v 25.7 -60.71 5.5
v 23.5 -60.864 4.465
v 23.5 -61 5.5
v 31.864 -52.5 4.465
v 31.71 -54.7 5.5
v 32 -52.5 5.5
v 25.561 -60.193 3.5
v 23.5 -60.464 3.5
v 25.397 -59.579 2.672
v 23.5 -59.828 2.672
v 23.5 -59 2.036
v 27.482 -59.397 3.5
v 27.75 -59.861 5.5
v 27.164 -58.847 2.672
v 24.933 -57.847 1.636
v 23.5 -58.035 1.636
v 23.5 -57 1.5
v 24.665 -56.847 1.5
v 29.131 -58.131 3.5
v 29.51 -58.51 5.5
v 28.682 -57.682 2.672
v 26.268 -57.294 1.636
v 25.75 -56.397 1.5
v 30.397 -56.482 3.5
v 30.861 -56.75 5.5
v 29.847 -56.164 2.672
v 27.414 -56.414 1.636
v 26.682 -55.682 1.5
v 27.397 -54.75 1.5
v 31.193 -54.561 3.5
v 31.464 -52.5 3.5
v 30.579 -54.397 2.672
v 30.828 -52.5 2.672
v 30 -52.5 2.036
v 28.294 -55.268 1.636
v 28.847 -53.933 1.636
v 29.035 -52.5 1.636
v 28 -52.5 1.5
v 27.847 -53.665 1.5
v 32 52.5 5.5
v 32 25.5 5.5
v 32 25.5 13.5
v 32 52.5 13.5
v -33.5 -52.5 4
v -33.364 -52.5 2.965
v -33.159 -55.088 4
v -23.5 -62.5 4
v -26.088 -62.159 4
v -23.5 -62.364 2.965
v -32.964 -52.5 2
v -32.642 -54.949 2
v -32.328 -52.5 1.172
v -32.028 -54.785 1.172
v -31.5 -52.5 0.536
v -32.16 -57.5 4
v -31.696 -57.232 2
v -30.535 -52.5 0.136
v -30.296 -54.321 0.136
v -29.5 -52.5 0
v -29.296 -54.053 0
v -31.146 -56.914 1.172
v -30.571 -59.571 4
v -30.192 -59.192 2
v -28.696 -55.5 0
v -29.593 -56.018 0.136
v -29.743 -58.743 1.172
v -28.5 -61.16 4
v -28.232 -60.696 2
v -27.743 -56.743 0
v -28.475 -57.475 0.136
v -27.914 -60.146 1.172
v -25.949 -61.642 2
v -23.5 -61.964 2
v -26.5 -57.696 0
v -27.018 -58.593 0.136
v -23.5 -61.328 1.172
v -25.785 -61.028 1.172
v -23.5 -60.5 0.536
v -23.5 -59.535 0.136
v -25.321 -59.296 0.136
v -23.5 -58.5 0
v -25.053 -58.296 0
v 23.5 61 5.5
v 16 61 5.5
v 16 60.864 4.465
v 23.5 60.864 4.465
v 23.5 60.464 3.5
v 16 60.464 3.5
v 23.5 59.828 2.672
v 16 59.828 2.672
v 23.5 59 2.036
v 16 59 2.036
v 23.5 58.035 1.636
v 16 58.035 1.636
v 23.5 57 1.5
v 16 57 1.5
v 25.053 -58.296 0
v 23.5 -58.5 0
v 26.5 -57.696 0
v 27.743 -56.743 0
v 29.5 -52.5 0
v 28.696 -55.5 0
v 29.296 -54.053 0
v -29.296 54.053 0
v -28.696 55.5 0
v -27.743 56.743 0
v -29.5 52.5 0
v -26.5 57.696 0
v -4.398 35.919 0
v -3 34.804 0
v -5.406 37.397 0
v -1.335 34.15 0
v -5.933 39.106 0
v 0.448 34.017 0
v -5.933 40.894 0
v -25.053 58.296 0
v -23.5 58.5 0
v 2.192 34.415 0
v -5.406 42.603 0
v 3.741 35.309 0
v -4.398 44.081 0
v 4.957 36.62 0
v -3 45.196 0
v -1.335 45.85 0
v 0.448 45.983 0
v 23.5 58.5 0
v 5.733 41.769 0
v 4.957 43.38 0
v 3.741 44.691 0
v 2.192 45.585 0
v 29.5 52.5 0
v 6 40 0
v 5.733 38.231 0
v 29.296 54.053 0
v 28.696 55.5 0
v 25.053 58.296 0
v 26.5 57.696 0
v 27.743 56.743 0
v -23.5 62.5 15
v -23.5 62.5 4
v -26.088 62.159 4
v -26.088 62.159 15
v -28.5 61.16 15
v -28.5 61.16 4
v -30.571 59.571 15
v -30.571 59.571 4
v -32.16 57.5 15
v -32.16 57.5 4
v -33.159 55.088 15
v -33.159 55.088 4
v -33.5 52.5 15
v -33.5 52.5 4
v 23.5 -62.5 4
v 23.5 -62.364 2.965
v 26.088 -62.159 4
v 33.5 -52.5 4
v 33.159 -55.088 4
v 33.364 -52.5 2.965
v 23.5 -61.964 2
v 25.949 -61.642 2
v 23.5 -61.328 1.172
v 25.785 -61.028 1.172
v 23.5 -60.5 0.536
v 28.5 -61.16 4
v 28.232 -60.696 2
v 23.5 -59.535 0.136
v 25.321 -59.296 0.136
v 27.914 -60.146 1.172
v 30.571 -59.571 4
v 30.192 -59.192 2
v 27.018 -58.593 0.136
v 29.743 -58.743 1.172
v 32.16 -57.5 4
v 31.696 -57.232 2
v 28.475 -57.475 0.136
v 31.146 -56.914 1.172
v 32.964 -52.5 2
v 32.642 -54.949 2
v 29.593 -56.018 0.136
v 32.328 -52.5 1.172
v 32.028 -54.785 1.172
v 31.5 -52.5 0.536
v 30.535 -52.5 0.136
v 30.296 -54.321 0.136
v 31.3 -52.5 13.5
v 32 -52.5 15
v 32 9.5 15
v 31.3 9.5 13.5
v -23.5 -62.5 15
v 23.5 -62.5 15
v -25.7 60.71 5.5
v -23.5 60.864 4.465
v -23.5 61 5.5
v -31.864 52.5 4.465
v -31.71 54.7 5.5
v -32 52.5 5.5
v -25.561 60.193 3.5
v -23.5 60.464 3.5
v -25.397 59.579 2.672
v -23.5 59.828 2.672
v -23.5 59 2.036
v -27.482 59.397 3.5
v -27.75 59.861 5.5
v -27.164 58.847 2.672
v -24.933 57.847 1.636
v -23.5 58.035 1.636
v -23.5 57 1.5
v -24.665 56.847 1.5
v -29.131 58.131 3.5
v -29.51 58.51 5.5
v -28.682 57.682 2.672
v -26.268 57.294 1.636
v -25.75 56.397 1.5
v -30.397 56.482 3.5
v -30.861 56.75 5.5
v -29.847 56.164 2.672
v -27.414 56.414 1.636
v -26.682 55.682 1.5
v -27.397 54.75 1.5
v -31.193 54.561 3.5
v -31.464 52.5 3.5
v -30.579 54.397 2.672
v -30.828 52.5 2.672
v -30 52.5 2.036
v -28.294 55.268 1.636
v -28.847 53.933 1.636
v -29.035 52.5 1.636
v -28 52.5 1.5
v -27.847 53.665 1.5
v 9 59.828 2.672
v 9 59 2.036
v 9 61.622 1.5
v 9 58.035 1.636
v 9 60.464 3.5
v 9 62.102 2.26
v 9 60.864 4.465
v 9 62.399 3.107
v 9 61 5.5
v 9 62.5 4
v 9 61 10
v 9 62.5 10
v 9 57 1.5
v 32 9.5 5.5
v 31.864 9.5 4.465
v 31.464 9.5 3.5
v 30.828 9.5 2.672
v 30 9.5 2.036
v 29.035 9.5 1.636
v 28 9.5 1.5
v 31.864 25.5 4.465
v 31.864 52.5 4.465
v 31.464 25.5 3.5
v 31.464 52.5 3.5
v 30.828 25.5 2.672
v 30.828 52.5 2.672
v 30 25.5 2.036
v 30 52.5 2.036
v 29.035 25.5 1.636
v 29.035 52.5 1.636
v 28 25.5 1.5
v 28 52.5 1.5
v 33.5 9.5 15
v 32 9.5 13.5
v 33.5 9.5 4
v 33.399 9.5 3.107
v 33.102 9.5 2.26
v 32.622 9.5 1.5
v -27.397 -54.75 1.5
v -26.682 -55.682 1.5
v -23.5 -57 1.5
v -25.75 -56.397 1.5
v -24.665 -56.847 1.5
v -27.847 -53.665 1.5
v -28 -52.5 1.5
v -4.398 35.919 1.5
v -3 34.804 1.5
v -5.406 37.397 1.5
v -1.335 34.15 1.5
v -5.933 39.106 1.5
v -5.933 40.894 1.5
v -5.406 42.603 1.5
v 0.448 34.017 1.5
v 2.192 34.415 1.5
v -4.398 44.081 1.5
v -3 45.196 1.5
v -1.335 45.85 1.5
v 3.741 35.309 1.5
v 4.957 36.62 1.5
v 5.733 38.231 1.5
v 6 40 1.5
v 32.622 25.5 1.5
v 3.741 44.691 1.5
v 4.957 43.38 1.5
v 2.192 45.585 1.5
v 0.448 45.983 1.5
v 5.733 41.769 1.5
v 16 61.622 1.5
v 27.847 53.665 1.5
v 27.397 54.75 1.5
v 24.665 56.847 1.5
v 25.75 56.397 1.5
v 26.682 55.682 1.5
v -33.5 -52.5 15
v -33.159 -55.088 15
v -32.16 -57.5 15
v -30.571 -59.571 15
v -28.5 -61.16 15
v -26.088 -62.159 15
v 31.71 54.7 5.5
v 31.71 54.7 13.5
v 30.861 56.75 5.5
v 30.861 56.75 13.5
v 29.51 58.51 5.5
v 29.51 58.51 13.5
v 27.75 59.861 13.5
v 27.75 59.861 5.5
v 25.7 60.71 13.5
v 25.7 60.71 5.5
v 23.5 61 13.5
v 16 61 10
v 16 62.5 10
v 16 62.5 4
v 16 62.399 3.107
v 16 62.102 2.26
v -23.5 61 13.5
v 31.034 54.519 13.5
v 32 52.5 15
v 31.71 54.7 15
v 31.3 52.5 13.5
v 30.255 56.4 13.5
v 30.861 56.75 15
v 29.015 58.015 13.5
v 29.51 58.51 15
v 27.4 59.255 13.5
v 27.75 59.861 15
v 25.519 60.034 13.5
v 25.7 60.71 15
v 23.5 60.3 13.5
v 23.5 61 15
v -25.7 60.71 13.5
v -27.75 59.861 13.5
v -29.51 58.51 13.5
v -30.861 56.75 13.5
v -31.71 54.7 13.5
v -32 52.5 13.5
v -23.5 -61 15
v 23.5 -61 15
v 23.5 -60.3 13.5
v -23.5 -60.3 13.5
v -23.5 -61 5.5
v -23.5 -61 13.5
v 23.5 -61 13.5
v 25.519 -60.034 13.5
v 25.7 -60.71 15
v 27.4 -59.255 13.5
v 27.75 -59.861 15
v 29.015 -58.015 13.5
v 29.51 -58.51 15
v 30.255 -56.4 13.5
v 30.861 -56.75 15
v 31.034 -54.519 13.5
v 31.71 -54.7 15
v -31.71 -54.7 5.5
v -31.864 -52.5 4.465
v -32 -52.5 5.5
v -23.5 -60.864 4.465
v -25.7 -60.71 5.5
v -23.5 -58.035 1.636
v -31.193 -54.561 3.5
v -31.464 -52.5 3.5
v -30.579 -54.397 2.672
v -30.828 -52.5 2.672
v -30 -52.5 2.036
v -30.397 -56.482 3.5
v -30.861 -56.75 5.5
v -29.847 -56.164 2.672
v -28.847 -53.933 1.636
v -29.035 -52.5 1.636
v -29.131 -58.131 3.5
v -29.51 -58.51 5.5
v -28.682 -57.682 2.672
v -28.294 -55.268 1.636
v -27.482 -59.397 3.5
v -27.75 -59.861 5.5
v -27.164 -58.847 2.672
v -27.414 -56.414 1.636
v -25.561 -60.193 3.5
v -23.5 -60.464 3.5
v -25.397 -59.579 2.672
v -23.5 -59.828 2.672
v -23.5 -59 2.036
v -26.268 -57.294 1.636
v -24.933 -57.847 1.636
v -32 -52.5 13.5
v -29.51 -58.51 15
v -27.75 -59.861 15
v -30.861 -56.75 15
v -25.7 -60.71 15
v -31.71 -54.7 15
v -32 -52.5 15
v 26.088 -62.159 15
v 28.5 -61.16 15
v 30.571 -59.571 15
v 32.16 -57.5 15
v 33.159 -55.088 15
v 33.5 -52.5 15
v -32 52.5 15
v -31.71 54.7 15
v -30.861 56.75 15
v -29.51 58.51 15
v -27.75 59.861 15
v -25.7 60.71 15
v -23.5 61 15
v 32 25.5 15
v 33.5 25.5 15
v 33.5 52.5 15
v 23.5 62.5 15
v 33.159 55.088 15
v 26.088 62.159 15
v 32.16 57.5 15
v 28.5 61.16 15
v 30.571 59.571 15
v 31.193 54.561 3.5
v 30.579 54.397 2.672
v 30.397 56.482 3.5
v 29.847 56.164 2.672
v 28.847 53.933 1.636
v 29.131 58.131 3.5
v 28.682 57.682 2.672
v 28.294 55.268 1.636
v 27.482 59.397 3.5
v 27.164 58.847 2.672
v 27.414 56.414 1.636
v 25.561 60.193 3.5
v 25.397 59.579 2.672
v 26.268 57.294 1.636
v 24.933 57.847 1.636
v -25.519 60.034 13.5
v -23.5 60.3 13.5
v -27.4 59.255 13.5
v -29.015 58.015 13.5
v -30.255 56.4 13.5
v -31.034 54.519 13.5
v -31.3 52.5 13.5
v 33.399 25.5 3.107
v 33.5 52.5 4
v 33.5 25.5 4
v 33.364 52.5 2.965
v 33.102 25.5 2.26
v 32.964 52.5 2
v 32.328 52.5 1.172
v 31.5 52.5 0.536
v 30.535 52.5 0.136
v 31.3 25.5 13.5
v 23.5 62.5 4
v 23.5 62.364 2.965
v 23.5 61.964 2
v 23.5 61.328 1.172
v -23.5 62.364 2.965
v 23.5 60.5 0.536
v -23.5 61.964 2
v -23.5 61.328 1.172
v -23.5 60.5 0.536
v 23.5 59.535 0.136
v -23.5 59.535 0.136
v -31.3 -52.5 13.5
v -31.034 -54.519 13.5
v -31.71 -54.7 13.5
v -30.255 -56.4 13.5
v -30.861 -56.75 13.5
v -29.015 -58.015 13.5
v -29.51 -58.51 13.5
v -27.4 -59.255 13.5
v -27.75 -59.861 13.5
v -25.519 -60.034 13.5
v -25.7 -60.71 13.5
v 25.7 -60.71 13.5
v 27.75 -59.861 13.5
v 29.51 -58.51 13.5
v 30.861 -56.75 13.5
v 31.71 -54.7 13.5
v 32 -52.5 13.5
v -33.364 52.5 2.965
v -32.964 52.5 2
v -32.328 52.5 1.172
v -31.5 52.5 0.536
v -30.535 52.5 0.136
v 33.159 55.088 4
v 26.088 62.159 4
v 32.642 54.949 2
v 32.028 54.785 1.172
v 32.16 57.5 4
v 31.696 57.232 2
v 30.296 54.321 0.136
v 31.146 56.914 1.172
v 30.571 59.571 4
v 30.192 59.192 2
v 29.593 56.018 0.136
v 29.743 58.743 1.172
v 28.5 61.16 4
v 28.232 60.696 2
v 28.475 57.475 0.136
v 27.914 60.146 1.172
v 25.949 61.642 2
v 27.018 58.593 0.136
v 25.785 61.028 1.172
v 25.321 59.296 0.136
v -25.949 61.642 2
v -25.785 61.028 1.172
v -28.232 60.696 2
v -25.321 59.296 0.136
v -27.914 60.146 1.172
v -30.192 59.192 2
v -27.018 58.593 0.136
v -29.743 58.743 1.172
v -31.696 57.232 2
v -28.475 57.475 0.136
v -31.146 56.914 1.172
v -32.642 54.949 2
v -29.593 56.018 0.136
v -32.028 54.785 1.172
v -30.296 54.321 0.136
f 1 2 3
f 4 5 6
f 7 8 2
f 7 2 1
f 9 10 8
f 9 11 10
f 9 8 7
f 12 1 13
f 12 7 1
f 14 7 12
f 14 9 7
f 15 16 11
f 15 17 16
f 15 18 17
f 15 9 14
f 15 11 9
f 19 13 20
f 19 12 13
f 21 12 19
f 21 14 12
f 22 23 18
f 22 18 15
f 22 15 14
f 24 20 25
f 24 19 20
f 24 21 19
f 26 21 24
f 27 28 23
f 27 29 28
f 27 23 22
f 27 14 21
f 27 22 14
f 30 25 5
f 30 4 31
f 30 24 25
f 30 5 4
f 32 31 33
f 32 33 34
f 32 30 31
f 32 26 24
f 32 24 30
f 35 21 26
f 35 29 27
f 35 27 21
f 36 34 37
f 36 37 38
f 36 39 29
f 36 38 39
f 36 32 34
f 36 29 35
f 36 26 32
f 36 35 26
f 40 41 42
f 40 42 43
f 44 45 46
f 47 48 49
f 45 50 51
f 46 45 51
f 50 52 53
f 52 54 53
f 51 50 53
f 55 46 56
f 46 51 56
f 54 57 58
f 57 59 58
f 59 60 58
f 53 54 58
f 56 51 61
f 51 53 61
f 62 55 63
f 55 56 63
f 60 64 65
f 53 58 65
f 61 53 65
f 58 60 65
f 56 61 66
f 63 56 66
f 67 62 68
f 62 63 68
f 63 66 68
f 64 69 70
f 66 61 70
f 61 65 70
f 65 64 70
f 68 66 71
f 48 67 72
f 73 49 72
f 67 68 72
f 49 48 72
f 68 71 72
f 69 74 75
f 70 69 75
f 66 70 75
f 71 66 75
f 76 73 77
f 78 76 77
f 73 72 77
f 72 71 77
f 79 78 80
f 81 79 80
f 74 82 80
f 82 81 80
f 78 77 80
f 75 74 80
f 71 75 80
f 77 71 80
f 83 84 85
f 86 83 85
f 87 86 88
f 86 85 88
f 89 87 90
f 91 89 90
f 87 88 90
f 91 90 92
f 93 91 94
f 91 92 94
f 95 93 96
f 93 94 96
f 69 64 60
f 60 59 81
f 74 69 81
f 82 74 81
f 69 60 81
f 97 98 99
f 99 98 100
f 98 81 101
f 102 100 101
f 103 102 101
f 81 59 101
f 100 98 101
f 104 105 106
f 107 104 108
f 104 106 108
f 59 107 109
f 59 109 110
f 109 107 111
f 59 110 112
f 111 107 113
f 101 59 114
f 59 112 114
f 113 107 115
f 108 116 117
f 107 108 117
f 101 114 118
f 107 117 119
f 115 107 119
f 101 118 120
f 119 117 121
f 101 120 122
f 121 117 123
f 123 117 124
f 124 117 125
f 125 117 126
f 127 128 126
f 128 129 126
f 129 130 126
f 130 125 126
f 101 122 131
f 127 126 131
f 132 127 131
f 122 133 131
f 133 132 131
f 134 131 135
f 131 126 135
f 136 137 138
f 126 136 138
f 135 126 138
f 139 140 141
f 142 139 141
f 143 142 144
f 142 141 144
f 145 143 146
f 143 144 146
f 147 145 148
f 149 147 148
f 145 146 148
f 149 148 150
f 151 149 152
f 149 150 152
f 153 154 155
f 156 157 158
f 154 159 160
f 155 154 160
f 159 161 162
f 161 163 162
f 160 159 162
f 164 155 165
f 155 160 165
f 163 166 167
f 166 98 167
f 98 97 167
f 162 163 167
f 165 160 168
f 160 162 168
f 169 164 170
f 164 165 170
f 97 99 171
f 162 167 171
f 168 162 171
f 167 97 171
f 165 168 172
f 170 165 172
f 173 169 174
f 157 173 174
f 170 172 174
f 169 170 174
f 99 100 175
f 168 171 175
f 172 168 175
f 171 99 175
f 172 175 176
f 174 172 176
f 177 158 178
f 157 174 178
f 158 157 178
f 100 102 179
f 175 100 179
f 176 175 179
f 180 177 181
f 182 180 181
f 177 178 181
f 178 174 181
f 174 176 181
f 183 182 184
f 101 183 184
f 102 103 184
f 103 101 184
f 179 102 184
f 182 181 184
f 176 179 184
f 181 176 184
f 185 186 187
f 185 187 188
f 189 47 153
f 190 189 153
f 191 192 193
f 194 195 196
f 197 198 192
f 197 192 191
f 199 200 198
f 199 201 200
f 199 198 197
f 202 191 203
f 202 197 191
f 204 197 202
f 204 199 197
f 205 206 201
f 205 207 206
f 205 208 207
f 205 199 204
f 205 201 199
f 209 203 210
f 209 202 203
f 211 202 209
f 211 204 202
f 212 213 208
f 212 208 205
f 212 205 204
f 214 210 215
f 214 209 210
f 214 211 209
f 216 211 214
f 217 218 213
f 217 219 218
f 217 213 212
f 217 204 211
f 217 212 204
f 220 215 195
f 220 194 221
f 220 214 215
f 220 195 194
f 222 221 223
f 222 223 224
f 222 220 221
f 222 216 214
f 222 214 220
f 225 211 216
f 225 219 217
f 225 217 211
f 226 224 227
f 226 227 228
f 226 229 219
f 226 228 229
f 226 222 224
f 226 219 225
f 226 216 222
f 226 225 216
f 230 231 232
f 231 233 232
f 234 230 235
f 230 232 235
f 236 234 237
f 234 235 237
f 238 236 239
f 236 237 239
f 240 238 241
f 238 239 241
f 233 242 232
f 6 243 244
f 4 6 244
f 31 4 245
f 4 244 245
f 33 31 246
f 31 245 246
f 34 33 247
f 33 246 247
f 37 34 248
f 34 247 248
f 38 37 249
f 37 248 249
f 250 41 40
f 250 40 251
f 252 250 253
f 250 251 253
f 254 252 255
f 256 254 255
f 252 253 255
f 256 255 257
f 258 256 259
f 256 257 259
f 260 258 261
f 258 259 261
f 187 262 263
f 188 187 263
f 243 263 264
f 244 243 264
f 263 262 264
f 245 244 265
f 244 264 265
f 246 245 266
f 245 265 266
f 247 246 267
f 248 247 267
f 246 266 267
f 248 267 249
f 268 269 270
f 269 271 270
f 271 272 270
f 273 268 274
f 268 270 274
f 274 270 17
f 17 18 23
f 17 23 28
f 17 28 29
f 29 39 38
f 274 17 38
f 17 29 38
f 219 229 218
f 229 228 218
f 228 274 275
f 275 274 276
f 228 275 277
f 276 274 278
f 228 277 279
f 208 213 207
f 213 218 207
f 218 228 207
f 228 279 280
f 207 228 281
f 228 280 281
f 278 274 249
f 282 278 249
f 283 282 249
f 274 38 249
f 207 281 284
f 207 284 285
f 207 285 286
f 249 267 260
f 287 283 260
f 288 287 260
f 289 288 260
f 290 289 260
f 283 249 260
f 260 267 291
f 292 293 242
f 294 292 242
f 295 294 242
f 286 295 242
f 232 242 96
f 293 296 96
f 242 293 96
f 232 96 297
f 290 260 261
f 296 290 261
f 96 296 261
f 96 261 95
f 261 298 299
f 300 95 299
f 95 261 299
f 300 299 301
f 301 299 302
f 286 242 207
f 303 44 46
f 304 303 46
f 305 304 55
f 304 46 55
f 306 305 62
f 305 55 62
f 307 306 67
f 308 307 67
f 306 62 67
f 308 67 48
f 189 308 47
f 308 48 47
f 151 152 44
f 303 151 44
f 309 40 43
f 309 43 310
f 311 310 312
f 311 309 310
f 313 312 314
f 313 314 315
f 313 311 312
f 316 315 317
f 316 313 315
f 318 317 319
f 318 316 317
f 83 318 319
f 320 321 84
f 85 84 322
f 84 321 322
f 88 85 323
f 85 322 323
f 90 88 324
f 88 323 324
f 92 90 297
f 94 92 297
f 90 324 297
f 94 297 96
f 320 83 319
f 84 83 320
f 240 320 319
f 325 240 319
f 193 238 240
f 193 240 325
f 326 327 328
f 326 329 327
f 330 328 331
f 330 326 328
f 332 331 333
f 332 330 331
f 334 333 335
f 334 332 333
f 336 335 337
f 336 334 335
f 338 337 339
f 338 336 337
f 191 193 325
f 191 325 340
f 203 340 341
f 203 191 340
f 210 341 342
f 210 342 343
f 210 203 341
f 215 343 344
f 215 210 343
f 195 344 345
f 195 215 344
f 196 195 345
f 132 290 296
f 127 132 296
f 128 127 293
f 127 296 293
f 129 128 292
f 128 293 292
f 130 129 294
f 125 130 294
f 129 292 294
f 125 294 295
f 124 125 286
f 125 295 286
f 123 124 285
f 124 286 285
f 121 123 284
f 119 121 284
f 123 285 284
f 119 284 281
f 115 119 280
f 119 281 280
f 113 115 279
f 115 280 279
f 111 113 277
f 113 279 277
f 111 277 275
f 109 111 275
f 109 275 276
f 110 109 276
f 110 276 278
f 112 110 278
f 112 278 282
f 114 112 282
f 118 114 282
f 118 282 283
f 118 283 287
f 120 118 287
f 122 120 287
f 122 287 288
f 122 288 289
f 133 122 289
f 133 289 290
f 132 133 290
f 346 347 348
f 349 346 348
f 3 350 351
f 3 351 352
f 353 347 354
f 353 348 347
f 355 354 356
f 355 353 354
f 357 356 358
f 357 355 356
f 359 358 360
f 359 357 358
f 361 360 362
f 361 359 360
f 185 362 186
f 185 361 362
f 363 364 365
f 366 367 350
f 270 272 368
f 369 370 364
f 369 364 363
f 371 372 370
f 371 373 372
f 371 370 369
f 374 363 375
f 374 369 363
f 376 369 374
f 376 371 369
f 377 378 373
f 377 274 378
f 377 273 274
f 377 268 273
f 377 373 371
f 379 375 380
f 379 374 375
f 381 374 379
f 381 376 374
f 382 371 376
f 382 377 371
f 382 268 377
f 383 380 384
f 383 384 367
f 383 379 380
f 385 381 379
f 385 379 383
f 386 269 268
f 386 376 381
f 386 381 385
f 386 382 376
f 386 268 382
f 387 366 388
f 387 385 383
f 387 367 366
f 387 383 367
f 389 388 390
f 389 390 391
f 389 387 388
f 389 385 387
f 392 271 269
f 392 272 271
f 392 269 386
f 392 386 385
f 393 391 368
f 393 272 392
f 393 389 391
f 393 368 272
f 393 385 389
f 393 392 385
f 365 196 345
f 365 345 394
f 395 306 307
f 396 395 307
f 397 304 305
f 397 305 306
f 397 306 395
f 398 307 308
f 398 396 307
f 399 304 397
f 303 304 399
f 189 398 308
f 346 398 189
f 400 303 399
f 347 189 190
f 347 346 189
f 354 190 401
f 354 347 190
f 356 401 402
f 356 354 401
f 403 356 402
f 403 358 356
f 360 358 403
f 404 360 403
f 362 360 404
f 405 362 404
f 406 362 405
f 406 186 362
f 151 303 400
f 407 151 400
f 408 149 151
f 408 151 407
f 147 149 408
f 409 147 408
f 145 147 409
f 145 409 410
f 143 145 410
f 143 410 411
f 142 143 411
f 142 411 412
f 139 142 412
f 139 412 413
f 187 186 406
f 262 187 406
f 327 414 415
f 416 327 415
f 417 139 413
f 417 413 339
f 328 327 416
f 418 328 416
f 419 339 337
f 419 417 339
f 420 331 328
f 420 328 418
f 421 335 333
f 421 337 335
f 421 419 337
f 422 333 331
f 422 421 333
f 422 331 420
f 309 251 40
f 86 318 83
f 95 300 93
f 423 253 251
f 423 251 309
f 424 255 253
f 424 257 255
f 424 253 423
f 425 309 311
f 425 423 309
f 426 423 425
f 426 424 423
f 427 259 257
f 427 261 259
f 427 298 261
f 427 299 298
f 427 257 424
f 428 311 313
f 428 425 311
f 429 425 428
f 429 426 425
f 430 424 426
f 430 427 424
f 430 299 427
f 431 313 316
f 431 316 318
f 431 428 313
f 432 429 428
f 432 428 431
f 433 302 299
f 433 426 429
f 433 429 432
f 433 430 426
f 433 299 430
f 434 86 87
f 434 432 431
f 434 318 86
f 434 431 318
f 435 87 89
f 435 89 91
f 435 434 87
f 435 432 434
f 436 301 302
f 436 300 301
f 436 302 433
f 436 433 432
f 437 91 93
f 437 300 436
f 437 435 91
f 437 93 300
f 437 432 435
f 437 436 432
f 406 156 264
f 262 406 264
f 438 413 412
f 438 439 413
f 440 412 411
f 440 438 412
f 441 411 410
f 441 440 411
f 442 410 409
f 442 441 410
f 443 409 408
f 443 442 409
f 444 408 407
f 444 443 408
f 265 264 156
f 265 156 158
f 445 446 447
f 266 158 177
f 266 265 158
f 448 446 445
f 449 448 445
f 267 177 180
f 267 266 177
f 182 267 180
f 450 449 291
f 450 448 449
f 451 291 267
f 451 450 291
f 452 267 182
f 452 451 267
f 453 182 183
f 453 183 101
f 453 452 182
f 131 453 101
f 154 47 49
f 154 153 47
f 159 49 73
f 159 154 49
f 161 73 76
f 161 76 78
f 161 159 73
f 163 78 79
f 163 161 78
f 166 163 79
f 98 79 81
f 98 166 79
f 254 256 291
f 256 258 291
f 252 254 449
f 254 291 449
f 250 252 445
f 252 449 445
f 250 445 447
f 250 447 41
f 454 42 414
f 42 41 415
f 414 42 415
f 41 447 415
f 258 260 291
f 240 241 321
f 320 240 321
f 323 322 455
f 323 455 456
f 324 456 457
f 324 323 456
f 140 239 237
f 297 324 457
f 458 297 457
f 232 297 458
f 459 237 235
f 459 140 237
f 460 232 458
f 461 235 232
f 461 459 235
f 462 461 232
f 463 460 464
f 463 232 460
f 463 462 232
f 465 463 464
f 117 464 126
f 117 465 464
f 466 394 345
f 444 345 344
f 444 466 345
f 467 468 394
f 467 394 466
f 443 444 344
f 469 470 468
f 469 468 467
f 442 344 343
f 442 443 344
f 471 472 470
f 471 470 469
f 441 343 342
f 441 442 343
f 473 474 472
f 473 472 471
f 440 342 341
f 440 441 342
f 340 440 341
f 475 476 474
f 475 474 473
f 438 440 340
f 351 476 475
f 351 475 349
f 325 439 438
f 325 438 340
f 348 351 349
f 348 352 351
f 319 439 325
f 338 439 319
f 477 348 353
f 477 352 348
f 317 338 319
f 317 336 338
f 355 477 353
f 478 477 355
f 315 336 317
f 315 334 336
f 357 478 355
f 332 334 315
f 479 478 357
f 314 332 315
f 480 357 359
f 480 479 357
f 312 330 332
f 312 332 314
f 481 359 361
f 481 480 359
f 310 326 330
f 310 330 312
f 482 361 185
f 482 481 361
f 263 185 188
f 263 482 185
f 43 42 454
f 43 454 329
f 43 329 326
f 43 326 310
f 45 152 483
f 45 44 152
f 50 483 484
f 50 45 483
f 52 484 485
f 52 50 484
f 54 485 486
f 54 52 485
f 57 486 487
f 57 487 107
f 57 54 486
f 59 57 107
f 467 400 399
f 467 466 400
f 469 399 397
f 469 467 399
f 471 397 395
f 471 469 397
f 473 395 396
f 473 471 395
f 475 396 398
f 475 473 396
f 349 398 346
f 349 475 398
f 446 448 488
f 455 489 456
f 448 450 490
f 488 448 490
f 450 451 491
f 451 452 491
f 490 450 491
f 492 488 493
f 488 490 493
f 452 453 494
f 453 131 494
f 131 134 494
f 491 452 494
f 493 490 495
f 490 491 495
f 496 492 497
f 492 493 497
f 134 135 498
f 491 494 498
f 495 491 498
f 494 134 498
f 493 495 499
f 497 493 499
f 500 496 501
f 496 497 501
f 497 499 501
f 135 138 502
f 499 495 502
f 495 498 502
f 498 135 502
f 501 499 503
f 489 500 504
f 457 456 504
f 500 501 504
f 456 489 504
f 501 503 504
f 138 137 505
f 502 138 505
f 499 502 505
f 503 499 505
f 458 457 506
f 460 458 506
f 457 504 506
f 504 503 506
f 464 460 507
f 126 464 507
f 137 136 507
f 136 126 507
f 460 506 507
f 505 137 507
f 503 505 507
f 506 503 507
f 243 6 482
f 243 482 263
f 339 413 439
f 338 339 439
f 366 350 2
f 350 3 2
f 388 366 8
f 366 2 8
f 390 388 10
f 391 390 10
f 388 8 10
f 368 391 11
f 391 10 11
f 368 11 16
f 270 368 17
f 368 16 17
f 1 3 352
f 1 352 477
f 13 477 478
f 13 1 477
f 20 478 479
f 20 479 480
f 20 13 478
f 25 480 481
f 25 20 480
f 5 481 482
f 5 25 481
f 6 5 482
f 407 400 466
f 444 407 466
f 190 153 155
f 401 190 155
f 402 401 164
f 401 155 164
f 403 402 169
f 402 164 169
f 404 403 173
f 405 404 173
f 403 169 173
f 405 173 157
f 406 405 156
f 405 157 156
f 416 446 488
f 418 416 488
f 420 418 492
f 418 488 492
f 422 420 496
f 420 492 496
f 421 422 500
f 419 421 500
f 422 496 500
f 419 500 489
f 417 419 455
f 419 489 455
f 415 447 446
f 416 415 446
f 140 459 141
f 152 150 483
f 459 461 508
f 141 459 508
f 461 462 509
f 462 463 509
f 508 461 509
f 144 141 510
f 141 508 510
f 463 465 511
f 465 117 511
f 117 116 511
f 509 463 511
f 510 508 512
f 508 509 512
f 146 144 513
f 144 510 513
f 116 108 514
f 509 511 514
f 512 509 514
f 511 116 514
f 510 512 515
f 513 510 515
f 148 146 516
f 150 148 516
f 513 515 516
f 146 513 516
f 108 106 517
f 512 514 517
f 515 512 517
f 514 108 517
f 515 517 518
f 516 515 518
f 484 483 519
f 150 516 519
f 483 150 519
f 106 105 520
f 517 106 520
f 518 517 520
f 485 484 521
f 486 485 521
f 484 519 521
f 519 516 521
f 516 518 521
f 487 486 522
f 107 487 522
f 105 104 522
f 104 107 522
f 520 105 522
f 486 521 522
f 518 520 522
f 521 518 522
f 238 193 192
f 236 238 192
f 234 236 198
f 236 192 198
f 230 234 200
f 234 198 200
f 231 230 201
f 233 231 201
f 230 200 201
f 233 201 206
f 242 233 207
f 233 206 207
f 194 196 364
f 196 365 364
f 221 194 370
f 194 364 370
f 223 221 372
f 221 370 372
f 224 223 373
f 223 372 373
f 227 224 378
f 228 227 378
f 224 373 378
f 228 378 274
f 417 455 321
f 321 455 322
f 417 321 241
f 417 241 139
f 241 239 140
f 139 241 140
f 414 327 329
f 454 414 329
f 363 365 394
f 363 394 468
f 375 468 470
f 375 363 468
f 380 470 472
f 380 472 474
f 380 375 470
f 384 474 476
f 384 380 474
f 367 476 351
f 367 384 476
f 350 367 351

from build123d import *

# Parameters (mm, degrees)
F1_DEPTH  = 15
F2_T      = -1.5
F3_R      = 6
F4_DEPTH  = 25
F5_R      = 4
F6_R      = 4
F12_DEPTH = 7
F13_W     = 7
F13_H     = 2.5
F14_DEPTH = 25


with BuildPart() as f1:
    # F0 (on Top) → F1 (new body)
    with BuildSketch(Plane.XY):
        with BuildLine():
            Line((23.5, 62.5), (-23.5, 62.5))
            ThreePointArc((-23.5, 62.5), (-30.5710678119, 59.5710678119), (-33.5, 52.5))
            Line((-33.5, 52.5), (-33.5, -52.5))
            ThreePointArc((-33.5, -52.5), (-30.5710678119, -59.5710678119), (-23.5, -62.5))
            Line((-23.5, -62.5), (23.5, -62.5))
            ThreePointArc((23.5, -62.5), (30.5710678119, -59.5710678119), (33.5, -52.5))
            Line((33.5, -52.5), (33.5, 52.5))
            ThreePointArc((33.5, 52.5), (30.5710678119, 59.5710678119), (23.5, 62.5))
        make_face()
    extrude(amount=F1_DEPTH)

    # F2
    f2_openings = [f1.faces().sort_by_distance(p)[0] for p in [
        (0, 0, 15),
    ]]
    offset(amount=F2_T, openings=f2_openings)

    # F3 (on face) → F4 (cut)
    with BuildSketch(Plane.XY.offset(1.5)):
        with Locations((0, 40)):
            Circle(F3_R)
    extrude(amount=-F4_DEPTH, mode=Mode.SUBTRACT)

    # F5
    f5_edges = [f1.edges().sort_by_distance(p)[0] for p in [
        (32, 0, 1.5),
        (29.510408, 58.510408, 1.5),
        (0, 61, 1.5),
        (-29.510408, 58.510408, 1.5),
        (-32, 0, 1.5),
        (-29.510408, -58.510408, 1.5),
        (0, -61, 1.5),
        (29.510408, -58.510408, 1.5),
    ]]
    fillet(f5_edges, radius=F5_R)

    # F6
    f6_edges = [f1.edges().sort_by_distance(p)[0] for p in [
        (-33.5, 0, 0),
        (-30.571068, 59.571068, 0),
        (-30.571068, -59.571068, 0),
        (0, -62.5, 0),
        (30.571068, -59.571068, 0),
        (33.5, 0, 0),
        (0, 62.5, 0),
        (30.571068, 59.571068, 0),
    ]]
    fillet(f6_edges, radius=F6_R)

    # F10: sweep along a path in F10_path
    with BuildLine(Plane(origin=(32, -52.5, 15), x_dir=(0, 1, 0), z_dir=(0, 0, 1))) as f10_path:
        Line((0, 0), (105, 0))
        ThreePointArc((105, 0), (111.0104076401, 2.4895923599), (113.5, 8.5))
        Line((113.5, 8.5), (113.5, 55.5))
        ThreePointArc((113.5, 55.5), (111.0104076401, 61.5104076401), (105, 64))
        Line((105, 64), (0, 64))
        ThreePointArc((0, 64), (-6.0104076401, 61.5104076401), (-8.5, 55.5))
        Line((-8.5, 55.5), (-8.5, 8.5))
    # F9 (on offset) → F10 (sweep)
    with BuildSketch(Plane.XZ.offset(52.5)):
        Polygon((32, 13.5), (32, 15), (31.3, 13.5), align=None)
    sweep(path=f10_path.line)

    # F11: sweep along a path in F11_path
    with BuildLine(Plane(origin=(23.5, -61, 15), x_dir=(0, -1, 0), z_dir=(0, 0, -1))) as f11_path:
        ThreePointArc((0, 0), (-2.4895923599, -6.0104076401), (-8.5, -8.5))
    # F9 (on offset) → F11 (sweep)
    with BuildSketch(Plane.XZ.offset(52.5)):
        Polygon((32, 13.5), (32, 15), (31.3, 13.5), align=None)
    sweep(path=f11_path.line)

    # F7 (on face) → F12 (cut)
    with BuildSketch(Plane.YZ.offset(33.5)):
        Polygon((25.5, 15), (9.5, 15), (9.5, 1.5), (25.5, 1.5), (25.5, 9.5), align=None)
    extrude(amount=-F12_DEPTH, mode=Mode.SUBTRACT)

    # F13 (on face) → F14 (cut)
    with BuildSketch(Plane(origin=(0, 62.5, 0), x_dir=(-1, 0, 0), z_dir=(0, 1, 0))):
        Polygon((-16, 10), (-16, 9.5), (-16, 4), (-9, 4), (-9, 10), align=None)
        with Locations((-12.5, 2.75)):
            Rectangle(F13_W, F13_H)
    extrude(amount=-F14_DEPTH, mode=Mode.SUBTRACT)


solid = f1.part
